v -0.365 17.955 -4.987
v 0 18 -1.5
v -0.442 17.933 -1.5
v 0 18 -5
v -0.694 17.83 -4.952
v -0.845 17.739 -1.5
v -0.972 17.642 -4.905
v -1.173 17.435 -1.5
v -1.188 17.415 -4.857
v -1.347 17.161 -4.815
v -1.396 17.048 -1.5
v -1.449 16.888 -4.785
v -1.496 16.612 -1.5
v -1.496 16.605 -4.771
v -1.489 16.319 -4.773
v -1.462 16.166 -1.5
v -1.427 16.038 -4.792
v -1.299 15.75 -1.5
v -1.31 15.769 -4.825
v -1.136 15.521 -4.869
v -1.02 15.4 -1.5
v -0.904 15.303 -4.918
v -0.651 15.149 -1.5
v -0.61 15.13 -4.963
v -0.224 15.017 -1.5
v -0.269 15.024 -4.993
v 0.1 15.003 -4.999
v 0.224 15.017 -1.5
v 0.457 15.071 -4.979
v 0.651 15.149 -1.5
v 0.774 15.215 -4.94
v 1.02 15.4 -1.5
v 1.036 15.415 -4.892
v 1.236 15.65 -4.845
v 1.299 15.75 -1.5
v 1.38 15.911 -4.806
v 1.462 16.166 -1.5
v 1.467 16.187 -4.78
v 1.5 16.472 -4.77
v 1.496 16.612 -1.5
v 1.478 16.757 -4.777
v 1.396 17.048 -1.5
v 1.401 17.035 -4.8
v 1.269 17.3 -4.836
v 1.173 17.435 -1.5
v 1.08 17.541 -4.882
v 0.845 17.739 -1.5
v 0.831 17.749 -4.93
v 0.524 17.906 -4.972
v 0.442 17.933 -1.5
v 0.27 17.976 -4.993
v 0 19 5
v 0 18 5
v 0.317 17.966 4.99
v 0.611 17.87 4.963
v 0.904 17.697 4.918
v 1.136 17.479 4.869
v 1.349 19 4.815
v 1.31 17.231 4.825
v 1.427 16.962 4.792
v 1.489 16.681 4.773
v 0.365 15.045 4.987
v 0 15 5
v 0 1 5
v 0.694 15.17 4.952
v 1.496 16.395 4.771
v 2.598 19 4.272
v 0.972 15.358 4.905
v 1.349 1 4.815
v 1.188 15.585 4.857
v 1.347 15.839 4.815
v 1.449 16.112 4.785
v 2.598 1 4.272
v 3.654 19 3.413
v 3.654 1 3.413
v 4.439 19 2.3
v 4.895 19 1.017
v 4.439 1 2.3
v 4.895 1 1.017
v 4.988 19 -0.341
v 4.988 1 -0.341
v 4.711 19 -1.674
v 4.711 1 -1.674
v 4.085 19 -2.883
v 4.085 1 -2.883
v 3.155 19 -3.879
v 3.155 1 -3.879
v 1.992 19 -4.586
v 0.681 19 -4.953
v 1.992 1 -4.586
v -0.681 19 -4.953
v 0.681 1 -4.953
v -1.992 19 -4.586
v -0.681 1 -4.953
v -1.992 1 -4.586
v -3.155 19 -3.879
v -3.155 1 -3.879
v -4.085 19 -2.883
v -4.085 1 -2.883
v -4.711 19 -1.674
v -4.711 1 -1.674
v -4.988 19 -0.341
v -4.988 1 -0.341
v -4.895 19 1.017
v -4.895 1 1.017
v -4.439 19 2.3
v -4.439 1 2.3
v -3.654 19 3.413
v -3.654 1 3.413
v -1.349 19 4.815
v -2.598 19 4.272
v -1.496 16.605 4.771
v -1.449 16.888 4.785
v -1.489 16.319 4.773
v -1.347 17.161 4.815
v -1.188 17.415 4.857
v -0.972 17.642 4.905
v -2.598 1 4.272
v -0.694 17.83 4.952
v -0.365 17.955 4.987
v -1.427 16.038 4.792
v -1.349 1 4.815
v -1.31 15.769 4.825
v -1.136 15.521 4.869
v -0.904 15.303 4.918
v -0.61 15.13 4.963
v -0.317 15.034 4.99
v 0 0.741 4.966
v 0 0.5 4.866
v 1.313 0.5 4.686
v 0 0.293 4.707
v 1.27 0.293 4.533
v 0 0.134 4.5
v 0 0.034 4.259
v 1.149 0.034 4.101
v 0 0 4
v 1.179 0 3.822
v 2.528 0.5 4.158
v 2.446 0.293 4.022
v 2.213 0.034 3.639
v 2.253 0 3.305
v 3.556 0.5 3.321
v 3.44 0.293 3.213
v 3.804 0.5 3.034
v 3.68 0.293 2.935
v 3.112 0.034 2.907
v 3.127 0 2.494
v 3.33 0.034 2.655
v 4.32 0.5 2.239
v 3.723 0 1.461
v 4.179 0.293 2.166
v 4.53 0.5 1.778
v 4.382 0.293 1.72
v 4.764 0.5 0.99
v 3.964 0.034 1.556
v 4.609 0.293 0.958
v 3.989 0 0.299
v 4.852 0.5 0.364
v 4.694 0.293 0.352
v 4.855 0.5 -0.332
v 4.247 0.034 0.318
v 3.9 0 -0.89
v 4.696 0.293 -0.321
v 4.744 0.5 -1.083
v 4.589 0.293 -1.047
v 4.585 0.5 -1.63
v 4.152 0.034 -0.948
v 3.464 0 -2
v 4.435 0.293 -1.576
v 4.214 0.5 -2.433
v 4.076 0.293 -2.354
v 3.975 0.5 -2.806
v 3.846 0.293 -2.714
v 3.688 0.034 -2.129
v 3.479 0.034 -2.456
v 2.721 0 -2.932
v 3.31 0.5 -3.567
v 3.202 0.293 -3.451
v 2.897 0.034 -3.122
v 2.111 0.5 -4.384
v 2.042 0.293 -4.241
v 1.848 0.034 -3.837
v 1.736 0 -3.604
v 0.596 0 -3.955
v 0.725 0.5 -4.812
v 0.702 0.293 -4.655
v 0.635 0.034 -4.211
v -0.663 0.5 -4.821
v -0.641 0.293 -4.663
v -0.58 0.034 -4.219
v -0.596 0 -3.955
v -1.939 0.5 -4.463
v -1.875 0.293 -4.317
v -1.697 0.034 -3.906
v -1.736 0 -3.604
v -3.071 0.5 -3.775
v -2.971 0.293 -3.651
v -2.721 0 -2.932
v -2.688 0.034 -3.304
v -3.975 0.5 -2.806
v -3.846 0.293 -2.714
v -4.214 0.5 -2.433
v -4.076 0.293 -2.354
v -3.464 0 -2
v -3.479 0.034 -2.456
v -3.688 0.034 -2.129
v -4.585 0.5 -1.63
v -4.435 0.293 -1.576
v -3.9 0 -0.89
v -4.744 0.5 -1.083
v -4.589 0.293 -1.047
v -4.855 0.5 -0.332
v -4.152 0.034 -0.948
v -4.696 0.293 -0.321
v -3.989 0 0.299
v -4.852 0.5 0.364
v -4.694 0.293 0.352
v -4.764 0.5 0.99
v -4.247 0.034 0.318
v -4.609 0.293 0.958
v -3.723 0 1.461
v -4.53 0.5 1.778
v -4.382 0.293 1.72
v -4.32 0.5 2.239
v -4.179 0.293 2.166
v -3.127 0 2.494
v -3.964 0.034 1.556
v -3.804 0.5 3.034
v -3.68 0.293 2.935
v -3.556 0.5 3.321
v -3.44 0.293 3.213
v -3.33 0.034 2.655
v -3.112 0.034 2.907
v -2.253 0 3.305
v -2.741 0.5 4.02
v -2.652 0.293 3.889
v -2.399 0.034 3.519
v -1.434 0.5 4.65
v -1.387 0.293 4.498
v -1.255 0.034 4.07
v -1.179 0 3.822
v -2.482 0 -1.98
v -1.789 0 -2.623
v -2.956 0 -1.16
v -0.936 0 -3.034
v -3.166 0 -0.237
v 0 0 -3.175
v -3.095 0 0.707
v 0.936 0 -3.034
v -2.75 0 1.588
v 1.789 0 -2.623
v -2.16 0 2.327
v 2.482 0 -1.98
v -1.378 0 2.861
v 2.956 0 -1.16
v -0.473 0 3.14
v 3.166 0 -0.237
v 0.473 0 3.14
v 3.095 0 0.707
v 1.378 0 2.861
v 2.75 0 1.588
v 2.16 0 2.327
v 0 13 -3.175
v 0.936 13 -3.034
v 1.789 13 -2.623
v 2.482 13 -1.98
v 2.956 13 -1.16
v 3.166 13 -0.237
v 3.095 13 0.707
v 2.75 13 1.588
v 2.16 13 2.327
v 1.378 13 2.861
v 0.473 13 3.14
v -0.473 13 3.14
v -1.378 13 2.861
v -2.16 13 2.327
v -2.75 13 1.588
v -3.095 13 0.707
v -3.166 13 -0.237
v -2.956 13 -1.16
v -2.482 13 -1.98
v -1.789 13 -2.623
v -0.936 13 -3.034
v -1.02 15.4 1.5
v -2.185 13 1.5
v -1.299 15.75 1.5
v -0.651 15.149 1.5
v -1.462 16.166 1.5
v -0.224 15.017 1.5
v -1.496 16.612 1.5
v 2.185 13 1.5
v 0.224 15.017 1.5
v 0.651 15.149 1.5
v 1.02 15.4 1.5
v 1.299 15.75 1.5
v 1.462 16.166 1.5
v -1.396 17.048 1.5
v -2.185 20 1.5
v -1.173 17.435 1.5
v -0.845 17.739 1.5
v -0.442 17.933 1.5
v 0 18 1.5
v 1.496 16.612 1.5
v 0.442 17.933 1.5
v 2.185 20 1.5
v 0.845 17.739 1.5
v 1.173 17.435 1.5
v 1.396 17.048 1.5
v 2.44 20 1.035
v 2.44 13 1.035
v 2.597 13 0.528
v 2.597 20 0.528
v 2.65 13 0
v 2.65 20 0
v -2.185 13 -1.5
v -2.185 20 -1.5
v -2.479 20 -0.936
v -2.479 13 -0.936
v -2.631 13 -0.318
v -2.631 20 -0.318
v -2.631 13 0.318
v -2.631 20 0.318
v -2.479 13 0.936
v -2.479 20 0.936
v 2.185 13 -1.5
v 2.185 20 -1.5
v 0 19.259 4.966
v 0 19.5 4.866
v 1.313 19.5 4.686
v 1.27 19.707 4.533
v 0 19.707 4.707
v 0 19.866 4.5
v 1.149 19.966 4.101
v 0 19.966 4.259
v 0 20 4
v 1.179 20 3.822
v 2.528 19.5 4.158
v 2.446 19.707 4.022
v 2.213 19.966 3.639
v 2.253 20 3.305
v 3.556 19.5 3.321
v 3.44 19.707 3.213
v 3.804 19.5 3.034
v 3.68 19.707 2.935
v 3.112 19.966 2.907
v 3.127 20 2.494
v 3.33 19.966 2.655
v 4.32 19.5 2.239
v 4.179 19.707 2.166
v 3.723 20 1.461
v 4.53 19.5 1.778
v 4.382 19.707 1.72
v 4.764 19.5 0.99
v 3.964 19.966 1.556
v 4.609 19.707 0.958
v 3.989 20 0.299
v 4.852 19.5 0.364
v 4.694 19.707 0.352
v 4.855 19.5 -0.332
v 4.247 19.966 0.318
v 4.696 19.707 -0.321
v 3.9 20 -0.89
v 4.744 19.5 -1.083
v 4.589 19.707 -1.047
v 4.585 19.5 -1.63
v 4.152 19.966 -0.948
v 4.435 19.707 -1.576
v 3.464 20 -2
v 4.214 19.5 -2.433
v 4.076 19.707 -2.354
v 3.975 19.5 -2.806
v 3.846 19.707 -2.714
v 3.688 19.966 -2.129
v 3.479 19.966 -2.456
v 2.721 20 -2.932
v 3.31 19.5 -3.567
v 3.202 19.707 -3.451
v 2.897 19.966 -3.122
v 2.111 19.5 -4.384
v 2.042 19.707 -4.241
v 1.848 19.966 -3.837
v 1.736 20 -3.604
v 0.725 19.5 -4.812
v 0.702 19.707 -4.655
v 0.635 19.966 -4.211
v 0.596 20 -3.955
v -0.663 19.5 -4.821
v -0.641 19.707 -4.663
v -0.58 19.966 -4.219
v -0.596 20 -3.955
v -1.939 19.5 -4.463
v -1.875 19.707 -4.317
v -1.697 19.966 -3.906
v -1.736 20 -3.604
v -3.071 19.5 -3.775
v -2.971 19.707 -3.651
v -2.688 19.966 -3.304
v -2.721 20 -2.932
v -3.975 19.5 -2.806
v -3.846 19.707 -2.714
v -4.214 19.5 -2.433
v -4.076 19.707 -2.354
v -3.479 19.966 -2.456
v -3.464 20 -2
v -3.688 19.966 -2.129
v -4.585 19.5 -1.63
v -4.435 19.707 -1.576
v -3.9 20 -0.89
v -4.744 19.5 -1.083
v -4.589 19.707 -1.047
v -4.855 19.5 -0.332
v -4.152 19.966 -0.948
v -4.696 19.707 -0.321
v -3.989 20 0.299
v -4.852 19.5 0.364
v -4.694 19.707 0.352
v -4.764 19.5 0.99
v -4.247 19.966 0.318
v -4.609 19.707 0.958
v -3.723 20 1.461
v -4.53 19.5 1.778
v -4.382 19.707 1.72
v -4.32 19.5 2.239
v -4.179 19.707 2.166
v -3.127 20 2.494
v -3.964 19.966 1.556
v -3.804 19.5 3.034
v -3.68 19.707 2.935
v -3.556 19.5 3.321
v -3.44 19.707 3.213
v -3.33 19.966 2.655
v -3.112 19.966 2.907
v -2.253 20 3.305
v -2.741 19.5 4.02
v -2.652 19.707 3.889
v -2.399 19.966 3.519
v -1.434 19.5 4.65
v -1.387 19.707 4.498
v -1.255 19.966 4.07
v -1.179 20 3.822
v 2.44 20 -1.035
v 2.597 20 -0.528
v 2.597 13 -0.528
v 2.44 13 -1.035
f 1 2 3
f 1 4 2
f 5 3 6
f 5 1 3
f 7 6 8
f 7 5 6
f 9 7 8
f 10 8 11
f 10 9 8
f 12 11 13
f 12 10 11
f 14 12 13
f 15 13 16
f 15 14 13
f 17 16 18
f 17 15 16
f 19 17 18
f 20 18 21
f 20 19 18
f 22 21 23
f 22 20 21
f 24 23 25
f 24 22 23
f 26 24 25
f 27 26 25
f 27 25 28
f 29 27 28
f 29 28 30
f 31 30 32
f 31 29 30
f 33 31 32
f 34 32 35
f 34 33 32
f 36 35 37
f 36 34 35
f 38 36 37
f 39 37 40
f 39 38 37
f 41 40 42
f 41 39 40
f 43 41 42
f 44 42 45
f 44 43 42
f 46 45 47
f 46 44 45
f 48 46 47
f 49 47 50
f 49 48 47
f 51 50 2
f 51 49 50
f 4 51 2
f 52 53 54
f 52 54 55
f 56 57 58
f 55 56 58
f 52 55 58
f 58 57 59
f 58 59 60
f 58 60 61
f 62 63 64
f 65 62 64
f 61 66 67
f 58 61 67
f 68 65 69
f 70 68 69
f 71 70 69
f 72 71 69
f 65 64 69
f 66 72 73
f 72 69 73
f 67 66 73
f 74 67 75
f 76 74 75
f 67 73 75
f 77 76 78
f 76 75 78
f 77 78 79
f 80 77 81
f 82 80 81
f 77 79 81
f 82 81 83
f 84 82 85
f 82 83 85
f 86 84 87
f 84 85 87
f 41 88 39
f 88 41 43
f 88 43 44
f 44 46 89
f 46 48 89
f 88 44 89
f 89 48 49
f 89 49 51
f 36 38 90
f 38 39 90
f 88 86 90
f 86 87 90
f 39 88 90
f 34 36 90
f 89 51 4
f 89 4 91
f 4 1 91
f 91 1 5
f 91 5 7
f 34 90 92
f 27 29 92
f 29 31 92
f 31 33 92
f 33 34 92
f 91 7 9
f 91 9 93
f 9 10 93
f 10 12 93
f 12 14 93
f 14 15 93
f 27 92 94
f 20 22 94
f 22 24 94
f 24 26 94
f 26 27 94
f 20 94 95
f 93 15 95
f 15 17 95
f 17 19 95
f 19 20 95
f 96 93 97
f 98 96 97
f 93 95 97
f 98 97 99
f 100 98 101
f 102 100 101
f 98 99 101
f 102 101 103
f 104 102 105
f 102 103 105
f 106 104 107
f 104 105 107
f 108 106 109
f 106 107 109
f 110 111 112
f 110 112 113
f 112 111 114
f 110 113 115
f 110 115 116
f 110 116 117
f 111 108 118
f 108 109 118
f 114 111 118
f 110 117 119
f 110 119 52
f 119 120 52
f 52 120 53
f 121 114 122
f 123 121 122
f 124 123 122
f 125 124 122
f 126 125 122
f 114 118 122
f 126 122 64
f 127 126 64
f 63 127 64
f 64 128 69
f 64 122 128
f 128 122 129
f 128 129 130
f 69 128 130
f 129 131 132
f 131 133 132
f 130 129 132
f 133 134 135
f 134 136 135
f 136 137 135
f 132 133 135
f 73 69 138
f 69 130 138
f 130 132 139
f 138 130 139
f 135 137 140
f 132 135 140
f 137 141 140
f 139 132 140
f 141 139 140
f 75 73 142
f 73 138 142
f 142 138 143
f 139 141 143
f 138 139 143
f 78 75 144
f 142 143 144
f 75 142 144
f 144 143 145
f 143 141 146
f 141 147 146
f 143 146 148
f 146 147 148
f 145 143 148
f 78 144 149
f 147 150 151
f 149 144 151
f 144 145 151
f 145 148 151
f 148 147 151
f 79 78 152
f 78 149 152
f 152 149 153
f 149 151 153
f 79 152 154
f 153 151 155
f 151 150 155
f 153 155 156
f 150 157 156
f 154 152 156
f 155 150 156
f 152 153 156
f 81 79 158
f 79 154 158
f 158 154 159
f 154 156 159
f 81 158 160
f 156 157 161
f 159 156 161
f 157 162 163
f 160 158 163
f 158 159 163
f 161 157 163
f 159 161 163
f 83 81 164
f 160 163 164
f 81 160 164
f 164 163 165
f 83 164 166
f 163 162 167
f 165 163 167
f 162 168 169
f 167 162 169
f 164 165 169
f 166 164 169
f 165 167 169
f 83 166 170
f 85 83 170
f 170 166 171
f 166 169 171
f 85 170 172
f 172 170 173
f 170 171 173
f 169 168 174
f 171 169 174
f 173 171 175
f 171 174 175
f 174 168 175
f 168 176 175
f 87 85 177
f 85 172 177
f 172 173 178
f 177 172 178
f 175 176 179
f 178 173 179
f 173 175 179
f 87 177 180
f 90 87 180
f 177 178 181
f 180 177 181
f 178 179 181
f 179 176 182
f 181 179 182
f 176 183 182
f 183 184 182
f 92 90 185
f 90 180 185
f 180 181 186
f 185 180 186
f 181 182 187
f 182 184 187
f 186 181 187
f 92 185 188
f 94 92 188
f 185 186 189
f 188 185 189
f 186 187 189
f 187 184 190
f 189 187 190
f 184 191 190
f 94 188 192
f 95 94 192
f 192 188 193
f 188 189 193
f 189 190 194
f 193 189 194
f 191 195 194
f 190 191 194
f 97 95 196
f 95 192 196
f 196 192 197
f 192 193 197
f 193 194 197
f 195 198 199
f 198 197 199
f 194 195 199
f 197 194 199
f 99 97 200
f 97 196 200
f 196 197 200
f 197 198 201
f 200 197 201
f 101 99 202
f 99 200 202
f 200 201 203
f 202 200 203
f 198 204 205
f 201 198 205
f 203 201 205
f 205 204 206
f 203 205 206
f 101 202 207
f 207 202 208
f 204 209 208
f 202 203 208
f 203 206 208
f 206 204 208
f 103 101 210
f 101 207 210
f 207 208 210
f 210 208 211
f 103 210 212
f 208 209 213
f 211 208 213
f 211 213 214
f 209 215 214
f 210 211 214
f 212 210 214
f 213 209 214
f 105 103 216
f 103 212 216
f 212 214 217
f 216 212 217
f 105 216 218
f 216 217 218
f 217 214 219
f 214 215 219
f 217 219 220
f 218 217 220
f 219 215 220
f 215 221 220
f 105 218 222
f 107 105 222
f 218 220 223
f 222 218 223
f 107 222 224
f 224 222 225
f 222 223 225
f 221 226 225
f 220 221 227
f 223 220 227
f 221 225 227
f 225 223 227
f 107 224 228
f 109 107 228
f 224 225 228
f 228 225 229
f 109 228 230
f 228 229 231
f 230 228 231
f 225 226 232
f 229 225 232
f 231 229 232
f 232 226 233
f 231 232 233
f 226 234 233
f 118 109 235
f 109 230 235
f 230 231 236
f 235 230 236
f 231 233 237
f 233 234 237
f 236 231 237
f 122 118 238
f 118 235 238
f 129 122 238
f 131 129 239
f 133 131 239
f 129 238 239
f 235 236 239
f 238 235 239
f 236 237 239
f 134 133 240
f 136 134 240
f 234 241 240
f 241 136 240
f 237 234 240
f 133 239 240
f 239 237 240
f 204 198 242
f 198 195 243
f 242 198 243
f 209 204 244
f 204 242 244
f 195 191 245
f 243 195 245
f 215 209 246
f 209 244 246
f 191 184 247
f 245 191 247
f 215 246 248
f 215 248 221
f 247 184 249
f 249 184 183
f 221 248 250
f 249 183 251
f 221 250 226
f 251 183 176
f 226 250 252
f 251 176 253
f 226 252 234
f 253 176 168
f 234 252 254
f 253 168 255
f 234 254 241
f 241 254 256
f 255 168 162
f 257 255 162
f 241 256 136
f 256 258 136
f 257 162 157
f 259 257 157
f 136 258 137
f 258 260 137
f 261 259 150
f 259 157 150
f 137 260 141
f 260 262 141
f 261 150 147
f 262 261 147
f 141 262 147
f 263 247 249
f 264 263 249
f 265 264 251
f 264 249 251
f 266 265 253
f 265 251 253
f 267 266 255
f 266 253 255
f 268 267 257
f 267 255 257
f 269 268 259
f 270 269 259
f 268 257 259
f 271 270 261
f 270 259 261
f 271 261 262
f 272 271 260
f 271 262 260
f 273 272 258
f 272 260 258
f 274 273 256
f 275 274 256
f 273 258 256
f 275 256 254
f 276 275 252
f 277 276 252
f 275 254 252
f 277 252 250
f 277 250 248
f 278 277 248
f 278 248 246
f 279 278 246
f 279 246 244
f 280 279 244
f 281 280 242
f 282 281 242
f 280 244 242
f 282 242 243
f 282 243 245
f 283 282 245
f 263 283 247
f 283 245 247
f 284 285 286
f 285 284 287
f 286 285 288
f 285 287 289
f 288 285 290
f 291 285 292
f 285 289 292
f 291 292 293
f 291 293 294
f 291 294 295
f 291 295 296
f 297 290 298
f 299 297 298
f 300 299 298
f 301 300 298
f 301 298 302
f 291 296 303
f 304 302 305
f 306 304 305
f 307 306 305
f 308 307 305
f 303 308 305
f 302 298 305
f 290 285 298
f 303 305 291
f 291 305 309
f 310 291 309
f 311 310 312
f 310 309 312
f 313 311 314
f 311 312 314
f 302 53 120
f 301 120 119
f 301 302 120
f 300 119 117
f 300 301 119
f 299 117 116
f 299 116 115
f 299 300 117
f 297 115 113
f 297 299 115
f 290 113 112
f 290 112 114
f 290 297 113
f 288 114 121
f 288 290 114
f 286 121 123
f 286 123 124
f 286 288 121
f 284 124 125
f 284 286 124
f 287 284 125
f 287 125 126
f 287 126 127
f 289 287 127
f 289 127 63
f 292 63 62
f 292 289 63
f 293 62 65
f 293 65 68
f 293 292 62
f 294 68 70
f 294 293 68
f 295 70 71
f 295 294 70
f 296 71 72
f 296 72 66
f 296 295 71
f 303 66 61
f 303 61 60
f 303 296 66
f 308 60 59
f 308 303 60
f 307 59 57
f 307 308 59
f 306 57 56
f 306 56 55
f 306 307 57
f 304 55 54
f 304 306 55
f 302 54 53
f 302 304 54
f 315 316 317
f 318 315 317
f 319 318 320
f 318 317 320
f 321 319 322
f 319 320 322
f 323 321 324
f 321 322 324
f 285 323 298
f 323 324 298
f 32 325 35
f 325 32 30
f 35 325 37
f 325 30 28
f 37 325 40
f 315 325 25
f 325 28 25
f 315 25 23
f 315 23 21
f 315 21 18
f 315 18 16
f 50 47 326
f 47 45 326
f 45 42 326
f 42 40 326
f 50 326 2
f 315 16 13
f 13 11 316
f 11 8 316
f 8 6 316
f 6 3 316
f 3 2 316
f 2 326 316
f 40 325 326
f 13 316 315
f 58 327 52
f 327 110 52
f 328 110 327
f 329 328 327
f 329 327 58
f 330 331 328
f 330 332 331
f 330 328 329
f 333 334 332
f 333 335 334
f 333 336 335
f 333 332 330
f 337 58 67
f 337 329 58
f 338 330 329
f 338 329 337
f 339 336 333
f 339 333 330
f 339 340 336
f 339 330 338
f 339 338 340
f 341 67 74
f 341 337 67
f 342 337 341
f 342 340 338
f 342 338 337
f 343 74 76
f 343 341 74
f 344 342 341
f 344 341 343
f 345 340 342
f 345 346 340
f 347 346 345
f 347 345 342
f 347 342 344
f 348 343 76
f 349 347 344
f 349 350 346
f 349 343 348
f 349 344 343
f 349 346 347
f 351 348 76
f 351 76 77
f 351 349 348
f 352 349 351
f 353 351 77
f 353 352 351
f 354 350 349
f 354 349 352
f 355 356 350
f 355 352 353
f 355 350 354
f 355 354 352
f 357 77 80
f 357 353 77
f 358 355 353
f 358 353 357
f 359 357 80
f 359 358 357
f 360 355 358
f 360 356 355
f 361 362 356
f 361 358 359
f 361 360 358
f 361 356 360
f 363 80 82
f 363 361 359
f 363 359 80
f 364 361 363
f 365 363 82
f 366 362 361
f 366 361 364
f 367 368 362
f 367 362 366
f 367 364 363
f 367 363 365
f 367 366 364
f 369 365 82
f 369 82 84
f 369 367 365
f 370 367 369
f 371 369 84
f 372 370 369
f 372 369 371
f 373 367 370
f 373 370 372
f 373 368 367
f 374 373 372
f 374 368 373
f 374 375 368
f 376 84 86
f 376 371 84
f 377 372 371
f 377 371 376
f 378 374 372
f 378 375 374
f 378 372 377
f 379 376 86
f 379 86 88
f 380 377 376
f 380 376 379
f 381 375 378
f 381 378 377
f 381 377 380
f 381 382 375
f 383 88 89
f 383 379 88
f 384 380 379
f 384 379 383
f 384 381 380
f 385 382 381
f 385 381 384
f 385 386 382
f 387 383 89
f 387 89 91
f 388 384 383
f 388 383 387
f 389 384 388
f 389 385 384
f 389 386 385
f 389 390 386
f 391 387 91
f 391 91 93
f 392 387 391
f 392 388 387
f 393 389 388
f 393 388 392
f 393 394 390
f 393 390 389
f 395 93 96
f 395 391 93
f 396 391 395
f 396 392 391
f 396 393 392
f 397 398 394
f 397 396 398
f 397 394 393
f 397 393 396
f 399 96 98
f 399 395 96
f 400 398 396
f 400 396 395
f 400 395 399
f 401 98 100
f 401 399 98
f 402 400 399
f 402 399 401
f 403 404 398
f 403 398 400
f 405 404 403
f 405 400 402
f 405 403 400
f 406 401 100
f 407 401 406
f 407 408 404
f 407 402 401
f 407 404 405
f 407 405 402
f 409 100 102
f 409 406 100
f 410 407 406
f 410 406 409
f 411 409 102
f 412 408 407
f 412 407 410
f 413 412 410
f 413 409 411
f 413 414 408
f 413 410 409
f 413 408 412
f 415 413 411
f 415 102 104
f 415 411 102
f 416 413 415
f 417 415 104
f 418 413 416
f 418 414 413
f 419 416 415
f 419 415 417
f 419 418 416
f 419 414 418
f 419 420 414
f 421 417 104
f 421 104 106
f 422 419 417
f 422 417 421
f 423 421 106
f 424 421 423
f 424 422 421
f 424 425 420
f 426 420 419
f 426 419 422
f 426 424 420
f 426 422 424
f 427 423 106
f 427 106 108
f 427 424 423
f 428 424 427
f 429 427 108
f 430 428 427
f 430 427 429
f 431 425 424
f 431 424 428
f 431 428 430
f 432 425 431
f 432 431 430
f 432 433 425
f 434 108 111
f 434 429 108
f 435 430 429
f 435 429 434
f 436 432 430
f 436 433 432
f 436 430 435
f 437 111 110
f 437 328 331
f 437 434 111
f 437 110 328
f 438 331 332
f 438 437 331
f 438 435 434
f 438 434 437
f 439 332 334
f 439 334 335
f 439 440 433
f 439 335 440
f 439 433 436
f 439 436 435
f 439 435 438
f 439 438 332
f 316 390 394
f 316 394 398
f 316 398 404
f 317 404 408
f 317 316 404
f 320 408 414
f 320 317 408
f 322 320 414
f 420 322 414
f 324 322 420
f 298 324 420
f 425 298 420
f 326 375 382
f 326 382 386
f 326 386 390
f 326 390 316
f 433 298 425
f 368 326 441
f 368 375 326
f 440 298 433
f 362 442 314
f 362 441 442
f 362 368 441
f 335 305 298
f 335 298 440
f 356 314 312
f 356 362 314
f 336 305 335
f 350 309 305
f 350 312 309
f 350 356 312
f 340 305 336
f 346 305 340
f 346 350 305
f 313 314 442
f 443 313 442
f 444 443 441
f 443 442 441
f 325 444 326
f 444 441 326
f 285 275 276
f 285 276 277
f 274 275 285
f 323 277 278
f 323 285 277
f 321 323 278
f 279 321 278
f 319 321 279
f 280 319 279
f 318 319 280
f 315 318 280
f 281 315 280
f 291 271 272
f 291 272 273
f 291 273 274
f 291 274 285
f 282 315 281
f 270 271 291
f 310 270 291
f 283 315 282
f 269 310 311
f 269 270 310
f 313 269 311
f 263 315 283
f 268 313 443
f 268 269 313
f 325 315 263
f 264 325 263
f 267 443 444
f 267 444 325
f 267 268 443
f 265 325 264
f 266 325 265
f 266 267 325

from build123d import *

# Parameters (mm, degrees)
CROQUIS1_R                 = 5
SALIENTE_EXTRUIR1_DEPTH    = 20
CORTAR_EXTRUIR1_DEPTH      = 7
CORTAR_EXTRUIR2_DEPTH      = 22.615966321
CORTAR_EXTRUIR2_DEPTH_BACK = 22.615966321
CROQUIS3_R                 = 1.5
CROQUIS4_R                 = 3.175
CORTAR_EXTRUIR3_DEPTH      = 13
REDONDEO1_R                = 1


with BuildPart() as part:
    # Croquis1 → Saliente-Extruir1 (new body)
    with BuildSketch(Plane(origin=(0, 0, 0), x_dir=(1, 0, 0), z_dir=(0, 1, 0))):
        with Locations(Location((0, 0, 0), (0, 0, 270))):
            Circle(CROQUIS1_R)
    extrude(amount=SALIENTE_EXTRUIR1_DEPTH)

    # Croquis2 → Cortar-Extruir1 (cut)
    with BuildSketch(Plane(origin=(0, 20, 0), x_dir=(1, 0, 0), z_dir=(0, 1, 0))):
        with BuildLine():
            Line((2.184605227, 1.5), (0, 1.5))
            Line((0, 1.5), (-2.184605227, 1.5))
            ThreePointArc((-2.184605227, 1.5), (-2.65, 0), (-2.184605227, -1.5))
            Line((-2.184605227, -1.5), (0, -1.5))
            Line((0, -1.5), (2.184605227, -1.5))
            ThreePointArc((2.184605227, -1.5), (2.530978452, -0.785269427), (2.65, 0))
            ThreePointArc((2.65, 0), (2.530978452, 0.785269427), (2.184605227, 1.5))
        make_face()
    extrude(amount=-CORTAR_EXTRUIR1_DEPTH, mode=Mode.SUBTRACT)

    # Croquis3 → Cortar-Extruir2 (cut, two sides: drawn at the far end of the back side and taken through both)
    with BuildSketch(Plane.XY.offset(-1.5).offset(-CORTAR_EXTRUIR2_DEPTH_BACK)):
        with Locations(Location((0, 16.5, 0), (0, 0, 90))):
            Circle(CROQUIS3_R)
    extrude(amount=CORTAR_EXTRUIR2_DEPTH + CORTAR_EXTRUIR2_DEPTH_BACK, mode=Mode.SUBTRACT)

    # Croquis4 → Cortar-Extruir3 (cut)
    with BuildSketch(Plane.XZ):
        with Locations(Location((0, 0, 0), (0, 0, 270))):
            Circle(CROQUIS4_R)
    extrude(amount=-CORTAR_EXTRUIR3_DEPTH, mode=Mode.SUBTRACT)

    # Redondeo1
    redondeo1_edges = [part.edges().sort_by_distance(p)[0] for p in [
        (0, 0, -5),
        (0, 20, -5),
    ]]
    fillet(redondeo1_edges, radius=REDONDEO1_R)


solid = part.part
